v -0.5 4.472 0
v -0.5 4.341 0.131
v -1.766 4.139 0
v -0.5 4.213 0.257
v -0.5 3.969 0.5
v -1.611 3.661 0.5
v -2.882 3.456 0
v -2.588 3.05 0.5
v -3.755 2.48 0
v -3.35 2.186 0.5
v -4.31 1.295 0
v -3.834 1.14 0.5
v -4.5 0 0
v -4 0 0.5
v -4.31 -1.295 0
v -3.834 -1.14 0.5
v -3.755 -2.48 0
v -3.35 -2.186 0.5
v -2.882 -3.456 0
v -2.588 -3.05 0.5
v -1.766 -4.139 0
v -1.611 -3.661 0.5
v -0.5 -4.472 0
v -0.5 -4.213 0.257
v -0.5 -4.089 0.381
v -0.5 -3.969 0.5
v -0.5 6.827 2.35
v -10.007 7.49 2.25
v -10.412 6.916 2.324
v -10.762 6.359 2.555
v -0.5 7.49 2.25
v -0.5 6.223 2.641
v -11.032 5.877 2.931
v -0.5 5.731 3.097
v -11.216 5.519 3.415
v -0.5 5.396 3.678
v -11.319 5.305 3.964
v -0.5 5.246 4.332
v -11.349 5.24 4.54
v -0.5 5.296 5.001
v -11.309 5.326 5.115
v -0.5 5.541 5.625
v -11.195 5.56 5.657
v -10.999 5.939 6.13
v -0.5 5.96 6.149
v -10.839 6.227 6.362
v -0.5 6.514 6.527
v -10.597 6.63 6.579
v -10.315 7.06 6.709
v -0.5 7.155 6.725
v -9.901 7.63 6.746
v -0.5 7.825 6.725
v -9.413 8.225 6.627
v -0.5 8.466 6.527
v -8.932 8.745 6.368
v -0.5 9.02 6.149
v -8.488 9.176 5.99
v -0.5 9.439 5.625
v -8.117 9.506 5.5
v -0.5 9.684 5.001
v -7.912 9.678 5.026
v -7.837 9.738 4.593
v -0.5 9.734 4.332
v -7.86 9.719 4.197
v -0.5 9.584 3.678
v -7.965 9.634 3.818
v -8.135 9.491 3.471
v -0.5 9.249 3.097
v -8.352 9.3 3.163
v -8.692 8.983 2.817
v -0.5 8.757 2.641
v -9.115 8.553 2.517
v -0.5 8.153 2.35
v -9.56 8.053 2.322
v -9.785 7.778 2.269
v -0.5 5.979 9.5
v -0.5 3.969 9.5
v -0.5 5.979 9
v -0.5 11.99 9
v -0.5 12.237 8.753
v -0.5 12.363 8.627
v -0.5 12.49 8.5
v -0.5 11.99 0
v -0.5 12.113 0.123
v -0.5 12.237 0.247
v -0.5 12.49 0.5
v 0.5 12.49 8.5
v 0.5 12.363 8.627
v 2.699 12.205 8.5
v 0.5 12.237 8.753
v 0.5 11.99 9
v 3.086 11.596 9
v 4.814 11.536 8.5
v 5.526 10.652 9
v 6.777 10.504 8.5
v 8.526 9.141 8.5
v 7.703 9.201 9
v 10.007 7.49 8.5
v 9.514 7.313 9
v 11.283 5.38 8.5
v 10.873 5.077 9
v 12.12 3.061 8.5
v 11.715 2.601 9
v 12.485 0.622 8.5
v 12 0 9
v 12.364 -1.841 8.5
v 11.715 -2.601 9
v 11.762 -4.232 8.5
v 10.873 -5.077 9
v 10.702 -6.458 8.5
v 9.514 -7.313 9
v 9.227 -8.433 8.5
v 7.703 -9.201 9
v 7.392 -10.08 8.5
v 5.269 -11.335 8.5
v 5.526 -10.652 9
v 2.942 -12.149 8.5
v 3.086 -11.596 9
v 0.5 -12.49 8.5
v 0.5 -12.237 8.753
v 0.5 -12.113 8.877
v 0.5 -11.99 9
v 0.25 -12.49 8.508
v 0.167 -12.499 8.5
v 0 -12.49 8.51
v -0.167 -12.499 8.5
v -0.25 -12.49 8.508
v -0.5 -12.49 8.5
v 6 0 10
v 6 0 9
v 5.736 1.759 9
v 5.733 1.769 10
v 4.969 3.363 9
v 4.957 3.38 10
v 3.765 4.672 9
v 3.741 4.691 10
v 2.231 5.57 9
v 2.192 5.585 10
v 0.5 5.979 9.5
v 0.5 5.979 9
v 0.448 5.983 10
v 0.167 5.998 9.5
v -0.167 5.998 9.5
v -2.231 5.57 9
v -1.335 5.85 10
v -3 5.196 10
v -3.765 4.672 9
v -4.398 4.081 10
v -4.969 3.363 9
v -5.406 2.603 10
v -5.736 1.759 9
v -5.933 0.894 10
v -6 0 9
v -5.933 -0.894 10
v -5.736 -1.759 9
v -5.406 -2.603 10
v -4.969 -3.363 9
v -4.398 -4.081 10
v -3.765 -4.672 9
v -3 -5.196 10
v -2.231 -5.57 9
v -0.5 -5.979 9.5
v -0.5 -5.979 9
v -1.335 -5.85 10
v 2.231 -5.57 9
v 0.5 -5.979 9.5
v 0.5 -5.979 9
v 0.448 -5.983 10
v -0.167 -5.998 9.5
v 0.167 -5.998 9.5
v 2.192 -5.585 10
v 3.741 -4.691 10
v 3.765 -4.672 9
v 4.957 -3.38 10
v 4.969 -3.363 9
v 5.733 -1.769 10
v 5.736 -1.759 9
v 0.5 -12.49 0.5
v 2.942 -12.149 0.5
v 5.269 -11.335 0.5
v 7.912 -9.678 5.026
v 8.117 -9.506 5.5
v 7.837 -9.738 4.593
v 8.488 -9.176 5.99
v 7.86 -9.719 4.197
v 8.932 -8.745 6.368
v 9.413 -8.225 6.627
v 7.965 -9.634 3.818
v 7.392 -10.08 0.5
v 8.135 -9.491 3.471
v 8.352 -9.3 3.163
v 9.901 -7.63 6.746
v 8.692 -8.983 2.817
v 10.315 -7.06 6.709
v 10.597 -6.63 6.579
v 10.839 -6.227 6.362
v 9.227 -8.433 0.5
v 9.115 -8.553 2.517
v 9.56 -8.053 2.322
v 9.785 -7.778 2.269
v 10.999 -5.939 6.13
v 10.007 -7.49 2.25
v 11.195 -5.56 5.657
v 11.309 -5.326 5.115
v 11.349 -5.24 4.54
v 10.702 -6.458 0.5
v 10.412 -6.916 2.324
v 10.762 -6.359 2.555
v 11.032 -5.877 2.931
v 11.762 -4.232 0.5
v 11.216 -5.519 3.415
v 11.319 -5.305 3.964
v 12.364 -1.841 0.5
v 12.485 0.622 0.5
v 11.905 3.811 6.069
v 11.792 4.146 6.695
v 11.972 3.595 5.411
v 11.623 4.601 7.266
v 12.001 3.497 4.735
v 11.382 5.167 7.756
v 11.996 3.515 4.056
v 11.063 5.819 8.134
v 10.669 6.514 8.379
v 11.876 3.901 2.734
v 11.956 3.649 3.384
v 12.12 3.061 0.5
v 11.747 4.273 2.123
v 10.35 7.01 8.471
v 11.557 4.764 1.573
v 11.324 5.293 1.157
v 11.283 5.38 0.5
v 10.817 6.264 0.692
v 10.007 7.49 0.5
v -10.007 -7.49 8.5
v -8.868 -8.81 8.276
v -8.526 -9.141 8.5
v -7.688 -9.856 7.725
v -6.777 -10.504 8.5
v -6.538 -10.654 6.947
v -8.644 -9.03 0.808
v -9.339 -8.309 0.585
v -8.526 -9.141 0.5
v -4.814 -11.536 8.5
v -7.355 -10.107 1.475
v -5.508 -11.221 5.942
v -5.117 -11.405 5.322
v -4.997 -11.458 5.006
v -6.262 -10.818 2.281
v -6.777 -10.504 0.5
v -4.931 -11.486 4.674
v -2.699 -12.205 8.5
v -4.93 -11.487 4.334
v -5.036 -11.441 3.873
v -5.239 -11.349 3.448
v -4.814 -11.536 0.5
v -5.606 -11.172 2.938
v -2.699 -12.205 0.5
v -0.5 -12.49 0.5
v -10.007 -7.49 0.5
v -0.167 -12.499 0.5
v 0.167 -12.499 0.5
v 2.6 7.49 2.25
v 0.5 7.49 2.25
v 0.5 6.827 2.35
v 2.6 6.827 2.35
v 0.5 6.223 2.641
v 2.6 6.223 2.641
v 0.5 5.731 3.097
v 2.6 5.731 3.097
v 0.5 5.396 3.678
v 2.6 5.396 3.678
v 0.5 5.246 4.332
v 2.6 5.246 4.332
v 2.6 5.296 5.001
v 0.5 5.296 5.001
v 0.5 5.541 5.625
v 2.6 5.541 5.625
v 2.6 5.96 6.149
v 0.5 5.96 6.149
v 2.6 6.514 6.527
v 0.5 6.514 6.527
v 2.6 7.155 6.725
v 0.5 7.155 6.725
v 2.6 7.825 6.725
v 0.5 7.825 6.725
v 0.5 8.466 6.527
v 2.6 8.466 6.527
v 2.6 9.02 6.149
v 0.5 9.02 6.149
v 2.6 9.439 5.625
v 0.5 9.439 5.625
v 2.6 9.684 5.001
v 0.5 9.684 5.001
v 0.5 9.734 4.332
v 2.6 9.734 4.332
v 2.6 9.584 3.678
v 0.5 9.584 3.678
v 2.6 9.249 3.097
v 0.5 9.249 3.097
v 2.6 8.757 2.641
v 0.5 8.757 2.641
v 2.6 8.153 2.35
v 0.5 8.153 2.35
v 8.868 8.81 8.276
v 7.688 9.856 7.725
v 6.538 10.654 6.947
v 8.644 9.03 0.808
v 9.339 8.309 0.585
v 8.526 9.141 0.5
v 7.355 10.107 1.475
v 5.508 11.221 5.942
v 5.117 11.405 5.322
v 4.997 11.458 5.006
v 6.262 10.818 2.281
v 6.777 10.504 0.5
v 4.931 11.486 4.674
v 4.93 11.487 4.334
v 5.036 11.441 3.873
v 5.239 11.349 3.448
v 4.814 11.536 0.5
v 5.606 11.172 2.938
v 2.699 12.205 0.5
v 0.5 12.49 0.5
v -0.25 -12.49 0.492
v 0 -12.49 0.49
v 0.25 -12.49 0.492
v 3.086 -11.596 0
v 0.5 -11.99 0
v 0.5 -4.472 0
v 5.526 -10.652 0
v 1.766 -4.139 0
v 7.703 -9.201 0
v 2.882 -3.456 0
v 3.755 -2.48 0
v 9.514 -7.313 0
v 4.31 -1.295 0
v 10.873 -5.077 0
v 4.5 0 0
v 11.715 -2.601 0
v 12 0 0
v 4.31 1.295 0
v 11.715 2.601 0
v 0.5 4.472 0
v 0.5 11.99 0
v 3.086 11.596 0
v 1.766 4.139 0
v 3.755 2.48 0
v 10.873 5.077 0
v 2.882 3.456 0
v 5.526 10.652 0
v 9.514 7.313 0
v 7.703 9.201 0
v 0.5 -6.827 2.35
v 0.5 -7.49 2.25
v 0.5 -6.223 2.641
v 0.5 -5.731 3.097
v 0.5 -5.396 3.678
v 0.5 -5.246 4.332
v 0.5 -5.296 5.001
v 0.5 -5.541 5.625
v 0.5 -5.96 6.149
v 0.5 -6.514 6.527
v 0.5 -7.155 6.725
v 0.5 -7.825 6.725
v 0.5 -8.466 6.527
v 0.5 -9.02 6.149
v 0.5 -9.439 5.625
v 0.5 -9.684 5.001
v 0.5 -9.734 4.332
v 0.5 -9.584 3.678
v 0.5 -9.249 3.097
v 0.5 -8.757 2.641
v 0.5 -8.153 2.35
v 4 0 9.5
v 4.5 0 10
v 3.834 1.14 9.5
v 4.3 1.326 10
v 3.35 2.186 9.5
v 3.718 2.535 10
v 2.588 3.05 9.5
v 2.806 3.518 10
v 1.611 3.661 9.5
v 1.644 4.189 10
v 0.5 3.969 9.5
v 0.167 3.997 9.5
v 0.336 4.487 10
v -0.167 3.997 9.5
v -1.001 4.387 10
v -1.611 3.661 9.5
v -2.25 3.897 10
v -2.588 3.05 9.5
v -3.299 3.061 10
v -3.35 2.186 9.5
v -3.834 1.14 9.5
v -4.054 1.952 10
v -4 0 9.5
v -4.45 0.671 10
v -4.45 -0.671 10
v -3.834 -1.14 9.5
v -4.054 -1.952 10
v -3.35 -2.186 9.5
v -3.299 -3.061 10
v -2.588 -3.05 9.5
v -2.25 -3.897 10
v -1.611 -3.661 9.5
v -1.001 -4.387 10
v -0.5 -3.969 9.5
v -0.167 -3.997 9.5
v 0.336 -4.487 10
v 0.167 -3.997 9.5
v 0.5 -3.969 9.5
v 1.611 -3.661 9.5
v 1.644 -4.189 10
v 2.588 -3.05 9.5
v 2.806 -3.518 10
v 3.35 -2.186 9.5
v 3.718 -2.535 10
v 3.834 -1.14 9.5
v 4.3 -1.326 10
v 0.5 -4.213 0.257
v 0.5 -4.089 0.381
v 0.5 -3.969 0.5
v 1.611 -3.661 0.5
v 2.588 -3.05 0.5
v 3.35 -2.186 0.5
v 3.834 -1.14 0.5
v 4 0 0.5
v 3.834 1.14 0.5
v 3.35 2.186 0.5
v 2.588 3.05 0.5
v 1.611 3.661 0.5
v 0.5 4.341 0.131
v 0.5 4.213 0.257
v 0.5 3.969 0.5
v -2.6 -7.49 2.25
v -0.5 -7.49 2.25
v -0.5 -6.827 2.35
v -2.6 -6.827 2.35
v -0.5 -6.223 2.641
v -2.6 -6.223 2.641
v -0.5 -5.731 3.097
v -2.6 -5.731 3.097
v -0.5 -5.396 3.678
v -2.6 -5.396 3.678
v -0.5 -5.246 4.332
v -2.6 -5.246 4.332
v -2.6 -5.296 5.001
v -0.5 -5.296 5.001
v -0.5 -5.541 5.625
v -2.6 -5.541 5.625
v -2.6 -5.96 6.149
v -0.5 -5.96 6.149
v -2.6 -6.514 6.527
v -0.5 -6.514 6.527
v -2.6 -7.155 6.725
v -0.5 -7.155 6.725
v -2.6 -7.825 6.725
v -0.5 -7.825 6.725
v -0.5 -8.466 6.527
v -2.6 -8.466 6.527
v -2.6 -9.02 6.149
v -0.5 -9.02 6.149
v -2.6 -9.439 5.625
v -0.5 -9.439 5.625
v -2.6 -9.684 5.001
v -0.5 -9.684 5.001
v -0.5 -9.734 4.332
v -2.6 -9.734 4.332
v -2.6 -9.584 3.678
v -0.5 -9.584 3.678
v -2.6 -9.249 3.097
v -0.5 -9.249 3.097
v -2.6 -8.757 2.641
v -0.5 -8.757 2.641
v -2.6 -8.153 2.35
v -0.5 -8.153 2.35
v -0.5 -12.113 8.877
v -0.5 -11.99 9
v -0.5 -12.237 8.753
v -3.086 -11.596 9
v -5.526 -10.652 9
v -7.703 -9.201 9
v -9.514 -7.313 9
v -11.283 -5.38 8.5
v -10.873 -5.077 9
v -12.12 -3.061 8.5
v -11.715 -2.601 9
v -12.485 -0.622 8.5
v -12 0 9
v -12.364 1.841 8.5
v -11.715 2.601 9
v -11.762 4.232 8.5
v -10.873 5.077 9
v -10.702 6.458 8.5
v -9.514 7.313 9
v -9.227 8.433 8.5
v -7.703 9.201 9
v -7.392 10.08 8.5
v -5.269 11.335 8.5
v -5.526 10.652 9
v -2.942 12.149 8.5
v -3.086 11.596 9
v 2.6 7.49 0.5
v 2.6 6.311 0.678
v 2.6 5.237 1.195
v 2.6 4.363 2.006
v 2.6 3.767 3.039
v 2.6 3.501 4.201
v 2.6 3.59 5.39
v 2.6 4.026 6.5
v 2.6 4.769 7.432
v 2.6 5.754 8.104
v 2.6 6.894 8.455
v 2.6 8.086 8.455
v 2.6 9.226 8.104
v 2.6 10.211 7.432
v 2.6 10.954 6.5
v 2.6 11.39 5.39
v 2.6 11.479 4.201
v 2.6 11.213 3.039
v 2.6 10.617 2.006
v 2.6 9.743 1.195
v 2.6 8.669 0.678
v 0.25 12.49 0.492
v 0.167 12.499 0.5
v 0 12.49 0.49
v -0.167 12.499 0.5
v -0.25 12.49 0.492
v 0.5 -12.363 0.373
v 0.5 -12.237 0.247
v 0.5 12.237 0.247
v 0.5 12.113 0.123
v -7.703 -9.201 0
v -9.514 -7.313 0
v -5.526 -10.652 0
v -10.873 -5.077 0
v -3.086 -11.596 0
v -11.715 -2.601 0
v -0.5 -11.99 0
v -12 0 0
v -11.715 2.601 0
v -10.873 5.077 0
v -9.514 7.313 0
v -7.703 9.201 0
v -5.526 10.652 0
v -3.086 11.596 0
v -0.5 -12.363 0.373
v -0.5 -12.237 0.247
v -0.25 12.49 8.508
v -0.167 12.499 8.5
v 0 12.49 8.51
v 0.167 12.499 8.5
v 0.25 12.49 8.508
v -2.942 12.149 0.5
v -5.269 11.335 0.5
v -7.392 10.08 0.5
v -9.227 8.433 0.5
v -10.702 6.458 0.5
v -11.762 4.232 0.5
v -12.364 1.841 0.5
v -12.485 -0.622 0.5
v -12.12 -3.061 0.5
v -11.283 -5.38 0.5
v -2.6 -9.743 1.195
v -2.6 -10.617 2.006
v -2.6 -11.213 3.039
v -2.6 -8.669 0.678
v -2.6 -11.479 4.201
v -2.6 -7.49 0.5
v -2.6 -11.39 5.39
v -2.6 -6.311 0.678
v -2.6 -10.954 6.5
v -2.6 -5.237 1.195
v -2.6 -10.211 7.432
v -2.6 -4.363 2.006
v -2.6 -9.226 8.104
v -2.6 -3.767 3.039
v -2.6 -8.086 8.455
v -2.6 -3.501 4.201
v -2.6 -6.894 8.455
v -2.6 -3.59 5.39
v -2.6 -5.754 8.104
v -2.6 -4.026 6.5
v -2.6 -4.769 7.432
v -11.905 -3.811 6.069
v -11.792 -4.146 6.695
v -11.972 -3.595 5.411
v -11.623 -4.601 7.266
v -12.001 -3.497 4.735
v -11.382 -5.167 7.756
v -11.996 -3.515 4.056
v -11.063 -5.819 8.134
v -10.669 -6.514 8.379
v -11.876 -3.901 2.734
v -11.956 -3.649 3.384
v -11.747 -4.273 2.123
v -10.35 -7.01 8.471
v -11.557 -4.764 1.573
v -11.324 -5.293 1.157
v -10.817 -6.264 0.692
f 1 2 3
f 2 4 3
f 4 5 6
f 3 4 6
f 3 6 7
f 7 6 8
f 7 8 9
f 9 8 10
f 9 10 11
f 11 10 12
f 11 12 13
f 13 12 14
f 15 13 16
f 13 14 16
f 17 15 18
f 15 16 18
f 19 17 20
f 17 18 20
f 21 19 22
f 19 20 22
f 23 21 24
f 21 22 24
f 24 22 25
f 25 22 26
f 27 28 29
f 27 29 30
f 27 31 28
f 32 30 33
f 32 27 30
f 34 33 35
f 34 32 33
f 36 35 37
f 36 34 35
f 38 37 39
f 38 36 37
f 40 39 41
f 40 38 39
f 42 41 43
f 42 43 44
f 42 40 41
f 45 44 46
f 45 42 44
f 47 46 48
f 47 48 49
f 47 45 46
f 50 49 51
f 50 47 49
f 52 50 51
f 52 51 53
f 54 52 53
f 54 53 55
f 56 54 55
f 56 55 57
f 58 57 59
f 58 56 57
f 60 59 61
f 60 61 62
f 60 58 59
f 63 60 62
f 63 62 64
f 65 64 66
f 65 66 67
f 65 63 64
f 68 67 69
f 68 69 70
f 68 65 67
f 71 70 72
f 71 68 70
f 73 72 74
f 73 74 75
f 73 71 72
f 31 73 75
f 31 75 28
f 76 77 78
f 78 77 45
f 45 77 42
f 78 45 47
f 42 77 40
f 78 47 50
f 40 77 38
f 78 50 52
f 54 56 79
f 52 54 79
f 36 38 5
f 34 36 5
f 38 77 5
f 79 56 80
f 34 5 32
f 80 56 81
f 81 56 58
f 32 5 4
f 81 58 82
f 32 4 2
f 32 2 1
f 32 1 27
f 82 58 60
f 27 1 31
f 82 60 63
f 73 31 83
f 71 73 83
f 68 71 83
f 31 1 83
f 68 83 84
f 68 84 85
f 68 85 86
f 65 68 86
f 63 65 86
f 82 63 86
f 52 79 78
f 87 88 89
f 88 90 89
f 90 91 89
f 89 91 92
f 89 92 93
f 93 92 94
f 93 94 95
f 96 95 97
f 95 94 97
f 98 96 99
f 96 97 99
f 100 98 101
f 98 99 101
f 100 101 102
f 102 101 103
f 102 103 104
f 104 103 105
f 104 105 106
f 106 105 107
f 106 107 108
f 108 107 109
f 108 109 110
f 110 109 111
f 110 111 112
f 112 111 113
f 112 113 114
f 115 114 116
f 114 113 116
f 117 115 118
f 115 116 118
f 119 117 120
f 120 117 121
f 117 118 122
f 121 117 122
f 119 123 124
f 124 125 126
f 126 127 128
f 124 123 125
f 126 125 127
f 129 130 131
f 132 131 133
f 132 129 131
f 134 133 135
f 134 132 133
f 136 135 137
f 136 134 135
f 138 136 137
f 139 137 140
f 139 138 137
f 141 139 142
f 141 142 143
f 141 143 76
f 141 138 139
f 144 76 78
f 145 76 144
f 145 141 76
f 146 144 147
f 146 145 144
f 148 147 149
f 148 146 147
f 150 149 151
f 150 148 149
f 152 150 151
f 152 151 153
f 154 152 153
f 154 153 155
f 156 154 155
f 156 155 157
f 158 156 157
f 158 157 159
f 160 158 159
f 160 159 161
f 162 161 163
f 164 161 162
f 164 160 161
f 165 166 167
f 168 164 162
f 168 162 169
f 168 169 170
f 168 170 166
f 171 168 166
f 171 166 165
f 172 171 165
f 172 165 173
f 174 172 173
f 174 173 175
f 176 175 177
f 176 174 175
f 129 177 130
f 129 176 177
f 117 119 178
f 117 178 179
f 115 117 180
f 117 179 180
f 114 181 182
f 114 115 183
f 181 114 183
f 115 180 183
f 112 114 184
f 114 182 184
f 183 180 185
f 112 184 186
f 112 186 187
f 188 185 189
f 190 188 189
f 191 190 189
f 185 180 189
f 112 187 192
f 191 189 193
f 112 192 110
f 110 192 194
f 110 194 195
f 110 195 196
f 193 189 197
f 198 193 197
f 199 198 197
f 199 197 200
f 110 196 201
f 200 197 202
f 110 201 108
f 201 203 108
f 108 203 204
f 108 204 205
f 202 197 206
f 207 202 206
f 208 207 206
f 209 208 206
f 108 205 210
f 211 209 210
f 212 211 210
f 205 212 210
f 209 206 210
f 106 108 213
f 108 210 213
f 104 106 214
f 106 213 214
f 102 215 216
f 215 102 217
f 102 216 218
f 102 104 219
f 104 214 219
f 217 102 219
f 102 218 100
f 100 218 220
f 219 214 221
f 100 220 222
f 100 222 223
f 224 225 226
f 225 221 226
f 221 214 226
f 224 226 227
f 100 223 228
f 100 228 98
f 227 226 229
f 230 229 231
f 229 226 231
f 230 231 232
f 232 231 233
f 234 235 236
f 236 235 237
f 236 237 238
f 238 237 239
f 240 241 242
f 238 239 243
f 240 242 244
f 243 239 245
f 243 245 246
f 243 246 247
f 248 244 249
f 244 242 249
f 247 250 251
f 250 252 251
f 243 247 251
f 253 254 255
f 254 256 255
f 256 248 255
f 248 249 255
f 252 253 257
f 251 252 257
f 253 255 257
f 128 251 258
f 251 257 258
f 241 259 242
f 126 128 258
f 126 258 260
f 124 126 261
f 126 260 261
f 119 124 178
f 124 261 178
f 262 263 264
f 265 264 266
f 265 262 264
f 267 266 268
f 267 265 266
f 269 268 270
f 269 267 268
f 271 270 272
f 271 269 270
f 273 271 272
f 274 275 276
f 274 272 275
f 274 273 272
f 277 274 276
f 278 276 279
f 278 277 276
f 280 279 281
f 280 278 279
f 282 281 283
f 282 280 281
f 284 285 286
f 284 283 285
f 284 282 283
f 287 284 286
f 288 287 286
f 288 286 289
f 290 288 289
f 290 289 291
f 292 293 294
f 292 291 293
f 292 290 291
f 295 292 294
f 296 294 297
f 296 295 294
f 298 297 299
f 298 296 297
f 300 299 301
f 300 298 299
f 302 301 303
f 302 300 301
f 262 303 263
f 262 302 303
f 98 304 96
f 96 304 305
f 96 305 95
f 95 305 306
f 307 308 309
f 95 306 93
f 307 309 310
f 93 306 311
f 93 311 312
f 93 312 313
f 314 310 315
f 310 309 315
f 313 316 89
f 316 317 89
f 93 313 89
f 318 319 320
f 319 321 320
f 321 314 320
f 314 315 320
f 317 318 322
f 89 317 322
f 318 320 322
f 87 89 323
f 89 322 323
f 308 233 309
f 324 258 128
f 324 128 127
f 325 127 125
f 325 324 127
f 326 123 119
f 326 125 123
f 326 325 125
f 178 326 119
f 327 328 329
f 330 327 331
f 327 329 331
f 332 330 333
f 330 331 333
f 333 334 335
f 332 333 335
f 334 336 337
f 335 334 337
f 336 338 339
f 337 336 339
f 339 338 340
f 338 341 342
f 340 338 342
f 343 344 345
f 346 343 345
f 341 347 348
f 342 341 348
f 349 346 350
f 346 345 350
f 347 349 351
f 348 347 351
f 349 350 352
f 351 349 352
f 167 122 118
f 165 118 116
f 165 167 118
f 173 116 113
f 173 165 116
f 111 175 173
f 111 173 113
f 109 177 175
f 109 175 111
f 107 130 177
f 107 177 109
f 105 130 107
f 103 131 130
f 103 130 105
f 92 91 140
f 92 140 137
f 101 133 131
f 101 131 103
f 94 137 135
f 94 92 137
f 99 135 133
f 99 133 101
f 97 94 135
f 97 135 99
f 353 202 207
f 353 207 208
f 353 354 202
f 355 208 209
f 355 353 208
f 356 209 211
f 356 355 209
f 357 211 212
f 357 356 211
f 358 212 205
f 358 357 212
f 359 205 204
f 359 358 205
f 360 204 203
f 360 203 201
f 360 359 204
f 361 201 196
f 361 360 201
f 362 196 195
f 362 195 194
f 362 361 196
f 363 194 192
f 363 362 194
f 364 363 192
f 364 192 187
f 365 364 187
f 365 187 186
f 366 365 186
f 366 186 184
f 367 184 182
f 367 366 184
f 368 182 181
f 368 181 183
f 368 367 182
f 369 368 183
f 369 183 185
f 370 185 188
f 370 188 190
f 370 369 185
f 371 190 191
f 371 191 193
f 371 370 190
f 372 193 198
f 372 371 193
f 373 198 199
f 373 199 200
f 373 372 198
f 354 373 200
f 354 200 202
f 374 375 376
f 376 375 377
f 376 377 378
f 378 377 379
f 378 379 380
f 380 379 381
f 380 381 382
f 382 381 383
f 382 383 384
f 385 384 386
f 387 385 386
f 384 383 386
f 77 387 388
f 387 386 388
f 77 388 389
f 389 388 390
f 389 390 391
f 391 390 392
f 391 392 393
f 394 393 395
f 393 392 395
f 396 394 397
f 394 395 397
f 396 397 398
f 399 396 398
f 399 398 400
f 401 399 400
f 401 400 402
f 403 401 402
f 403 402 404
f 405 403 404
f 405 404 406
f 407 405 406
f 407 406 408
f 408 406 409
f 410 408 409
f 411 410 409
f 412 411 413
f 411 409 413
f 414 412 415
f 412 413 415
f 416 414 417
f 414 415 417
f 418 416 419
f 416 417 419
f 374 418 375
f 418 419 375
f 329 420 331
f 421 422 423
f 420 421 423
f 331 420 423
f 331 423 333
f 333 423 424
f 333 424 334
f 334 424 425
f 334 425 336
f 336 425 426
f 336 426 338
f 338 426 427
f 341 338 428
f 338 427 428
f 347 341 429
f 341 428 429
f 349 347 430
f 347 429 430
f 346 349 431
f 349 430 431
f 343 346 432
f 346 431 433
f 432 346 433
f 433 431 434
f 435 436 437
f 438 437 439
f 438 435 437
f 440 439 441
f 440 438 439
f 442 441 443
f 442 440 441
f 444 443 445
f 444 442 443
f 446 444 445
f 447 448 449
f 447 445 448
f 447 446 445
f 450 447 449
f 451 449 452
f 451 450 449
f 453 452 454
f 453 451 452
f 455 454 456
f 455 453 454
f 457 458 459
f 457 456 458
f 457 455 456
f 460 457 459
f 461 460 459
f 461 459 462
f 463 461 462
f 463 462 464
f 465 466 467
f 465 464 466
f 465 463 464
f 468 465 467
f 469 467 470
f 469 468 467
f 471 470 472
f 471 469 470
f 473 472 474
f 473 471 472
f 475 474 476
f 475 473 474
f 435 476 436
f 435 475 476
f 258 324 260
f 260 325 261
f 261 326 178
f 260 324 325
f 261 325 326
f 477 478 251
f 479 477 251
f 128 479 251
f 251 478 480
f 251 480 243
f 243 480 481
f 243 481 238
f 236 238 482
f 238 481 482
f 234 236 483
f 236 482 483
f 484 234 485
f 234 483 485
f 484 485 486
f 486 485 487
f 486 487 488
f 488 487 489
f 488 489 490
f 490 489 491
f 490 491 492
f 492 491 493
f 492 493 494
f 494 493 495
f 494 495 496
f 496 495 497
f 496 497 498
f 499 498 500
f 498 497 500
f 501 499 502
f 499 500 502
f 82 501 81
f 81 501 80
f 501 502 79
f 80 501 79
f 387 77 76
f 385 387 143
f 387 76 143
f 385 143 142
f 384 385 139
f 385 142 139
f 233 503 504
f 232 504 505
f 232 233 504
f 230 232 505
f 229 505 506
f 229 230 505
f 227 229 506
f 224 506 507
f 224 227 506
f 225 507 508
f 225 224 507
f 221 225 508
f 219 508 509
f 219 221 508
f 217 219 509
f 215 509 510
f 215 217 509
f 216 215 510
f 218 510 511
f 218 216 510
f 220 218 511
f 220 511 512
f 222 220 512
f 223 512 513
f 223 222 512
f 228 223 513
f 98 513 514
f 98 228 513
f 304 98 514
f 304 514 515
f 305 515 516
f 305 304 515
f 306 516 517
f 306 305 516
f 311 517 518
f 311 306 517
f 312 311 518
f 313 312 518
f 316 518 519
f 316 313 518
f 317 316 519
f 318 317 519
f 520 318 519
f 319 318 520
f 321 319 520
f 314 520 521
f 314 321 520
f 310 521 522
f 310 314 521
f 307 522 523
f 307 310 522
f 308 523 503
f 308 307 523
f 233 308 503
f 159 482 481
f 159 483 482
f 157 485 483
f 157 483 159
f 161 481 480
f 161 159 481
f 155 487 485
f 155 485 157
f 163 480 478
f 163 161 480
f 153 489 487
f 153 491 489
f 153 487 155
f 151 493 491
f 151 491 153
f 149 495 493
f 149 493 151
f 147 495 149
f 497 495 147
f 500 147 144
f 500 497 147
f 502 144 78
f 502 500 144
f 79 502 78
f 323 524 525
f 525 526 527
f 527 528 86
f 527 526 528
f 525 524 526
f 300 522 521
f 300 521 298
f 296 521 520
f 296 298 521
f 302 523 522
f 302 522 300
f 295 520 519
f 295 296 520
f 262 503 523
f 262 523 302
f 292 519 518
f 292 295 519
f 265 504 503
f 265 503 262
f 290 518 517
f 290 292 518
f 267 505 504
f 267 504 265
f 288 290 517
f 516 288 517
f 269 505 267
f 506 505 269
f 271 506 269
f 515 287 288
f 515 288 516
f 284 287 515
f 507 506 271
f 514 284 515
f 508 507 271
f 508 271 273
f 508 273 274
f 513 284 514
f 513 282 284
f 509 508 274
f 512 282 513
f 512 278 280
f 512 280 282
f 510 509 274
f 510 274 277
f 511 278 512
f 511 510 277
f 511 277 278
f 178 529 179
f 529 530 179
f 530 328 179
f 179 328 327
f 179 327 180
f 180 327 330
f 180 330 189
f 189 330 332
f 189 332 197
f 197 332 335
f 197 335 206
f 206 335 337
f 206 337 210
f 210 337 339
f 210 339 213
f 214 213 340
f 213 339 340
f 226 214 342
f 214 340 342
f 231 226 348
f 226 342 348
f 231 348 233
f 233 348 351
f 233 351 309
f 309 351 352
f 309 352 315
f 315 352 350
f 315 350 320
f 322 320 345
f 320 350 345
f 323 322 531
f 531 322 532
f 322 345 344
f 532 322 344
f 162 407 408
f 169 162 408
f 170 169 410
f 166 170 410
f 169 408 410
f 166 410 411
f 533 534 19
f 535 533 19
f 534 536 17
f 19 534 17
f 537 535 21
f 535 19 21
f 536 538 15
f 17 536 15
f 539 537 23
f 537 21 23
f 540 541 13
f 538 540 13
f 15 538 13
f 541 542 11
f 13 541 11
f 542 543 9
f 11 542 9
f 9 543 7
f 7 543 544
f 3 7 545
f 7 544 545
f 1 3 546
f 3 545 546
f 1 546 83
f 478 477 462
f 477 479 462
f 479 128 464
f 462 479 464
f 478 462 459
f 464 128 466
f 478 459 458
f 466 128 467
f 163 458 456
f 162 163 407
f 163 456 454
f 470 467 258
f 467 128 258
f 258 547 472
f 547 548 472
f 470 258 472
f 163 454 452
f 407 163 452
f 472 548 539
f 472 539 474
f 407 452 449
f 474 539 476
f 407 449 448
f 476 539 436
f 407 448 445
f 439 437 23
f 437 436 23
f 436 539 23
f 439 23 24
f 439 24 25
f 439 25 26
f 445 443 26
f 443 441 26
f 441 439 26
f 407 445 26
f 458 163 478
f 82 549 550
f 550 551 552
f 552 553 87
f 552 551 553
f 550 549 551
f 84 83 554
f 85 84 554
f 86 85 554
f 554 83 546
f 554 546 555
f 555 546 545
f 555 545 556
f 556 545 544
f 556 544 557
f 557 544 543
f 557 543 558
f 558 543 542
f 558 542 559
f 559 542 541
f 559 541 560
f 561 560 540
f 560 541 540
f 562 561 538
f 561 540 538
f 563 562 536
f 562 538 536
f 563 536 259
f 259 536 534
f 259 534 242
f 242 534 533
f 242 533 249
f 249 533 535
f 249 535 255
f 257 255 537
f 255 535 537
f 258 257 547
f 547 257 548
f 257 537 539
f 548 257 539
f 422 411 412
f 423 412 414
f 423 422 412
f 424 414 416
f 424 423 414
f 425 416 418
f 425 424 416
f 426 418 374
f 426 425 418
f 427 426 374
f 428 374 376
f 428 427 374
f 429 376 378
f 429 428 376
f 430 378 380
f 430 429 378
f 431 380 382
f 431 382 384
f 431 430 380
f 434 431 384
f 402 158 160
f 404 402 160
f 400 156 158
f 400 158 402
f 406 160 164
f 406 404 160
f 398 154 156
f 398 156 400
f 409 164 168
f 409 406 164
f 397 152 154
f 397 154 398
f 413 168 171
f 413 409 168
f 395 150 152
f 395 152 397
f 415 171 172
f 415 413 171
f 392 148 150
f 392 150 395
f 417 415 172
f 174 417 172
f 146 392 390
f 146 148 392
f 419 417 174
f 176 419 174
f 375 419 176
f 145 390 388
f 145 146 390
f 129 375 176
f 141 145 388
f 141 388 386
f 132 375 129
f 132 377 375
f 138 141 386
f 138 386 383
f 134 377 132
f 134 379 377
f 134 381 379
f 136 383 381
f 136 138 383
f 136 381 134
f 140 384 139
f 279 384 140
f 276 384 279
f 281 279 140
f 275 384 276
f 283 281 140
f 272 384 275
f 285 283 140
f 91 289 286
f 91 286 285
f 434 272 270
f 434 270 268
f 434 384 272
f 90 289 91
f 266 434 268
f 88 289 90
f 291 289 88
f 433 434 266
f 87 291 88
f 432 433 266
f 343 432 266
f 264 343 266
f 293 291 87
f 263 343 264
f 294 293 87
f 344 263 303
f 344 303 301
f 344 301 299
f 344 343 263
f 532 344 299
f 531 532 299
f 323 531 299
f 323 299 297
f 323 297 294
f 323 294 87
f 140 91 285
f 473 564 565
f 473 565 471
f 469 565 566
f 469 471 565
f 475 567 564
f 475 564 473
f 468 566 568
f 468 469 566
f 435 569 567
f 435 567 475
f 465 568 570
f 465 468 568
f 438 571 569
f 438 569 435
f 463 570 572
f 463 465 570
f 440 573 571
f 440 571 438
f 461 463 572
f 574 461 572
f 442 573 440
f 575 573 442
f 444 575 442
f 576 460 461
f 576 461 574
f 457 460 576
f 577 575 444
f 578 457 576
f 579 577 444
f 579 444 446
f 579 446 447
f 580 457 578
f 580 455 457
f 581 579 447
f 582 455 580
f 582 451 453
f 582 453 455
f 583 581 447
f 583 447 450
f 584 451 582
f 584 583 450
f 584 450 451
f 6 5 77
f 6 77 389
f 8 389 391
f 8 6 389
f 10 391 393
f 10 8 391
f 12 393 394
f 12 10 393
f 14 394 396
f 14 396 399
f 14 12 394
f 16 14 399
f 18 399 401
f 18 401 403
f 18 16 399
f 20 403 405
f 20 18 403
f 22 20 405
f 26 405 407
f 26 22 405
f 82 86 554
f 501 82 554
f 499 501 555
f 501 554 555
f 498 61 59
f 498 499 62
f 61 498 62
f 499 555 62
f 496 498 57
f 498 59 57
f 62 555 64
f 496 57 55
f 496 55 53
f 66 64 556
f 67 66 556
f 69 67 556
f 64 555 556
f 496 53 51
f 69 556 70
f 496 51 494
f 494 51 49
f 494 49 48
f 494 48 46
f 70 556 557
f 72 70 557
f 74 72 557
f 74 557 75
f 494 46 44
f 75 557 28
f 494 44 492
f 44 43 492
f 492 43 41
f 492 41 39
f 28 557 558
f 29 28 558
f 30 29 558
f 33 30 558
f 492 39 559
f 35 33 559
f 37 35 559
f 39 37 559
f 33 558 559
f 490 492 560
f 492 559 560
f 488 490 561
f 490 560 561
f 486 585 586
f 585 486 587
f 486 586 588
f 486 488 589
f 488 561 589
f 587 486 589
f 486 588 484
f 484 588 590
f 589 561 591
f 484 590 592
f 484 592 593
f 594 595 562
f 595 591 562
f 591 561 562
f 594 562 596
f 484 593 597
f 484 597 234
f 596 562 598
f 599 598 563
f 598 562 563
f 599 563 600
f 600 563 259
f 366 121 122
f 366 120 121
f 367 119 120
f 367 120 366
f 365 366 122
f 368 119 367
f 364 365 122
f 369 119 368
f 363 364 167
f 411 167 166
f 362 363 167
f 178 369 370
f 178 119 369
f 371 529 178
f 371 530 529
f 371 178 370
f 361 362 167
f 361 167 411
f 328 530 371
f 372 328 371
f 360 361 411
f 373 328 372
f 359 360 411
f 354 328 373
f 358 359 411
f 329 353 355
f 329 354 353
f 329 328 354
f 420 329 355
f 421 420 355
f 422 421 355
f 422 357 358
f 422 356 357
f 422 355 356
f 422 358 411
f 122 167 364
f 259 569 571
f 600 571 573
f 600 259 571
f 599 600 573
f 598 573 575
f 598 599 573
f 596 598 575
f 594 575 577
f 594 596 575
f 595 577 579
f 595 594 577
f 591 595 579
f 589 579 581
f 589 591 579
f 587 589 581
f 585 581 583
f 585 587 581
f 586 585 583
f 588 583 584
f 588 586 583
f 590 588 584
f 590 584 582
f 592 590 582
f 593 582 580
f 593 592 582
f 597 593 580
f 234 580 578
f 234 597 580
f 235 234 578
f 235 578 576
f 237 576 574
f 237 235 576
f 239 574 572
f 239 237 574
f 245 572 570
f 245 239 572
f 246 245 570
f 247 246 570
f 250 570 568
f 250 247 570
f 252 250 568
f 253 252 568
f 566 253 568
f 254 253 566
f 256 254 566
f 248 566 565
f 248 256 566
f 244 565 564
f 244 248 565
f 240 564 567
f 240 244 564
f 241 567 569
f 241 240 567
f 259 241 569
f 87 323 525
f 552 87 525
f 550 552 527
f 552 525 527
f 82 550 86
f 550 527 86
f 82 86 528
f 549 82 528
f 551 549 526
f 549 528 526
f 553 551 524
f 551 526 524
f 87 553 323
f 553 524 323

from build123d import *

# Parameters (mm, degrees)
CROQUIS1_R              = 12.5
CROQUIS1_R_2            = 4
SALIENTE_EXTRUIR1_DEPTH = 10
CROQUIS2_OUTSIDE_W      = 34.348
CROQUIS2_OUTSIDE_H      = 34.348
CROQUIS2_OUTSIDE_R      = 6
CORTAR_EXTRUIR1_DEPTH   = 1
CHAFL_N1_SIZE           = 0.5
CROQUIS3_W              = 1
CROQUIS3_H              = 24.979991994
CORTAR_EXTRUIR2_DEPTH   = 9.5
MATRIZC1_COUNT          = 2
MATRIZC1_ANGLE          = 180


with BuildPart() as part:
    # Croquis1 → Saliente-Extruir1 (new body)
    with BuildSketch(Plane.XY):
        Circle(CROQUIS1_R)
        Circle(CROQUIS1_R_2, mode=Mode.SUBTRACT)
    extrude(amount=SALIENTE_EXTRUIR1_DEPTH)

    # Croquis2 outside → Cortar-Extruir1 (cut)
    with BuildSketch(Plane.XY.offset(10)):
        Rectangle(CROQUIS2_OUTSIDE_W, CROQUIS2_OUTSIDE_H)
        Circle(CROQUIS2_OUTSIDE_R, mode=Mode.SUBTRACT)
    extrude(amount=-CORTAR_EXTRUIR1_DEPTH, mode=Mode.SUBTRACT)

    # Chaflán1
    chafl_n1_edges = [part.edges().sort_by_distance(p)[0] for p in [
        (-12.5, 0, 9),
        (-12.5, 0, 0),
        (-4, 0, 0),
        (-4, 0, 10),
    ]]
    chamfer(chafl_n1_edges, length=CHAFL_N1_SIZE)

    # Croquis3 → Cortar-Extruir2 (cut)
    with BuildSketch(Plane.XY):
        Rectangle(CROQUIS3_W, CROQUIS3_H)
    extrude(amount=CORTAR_EXTRUIR2_DEPTH, mode=Mode.SUBTRACT)

    # Croquis8 → Refrentado para tornillo con cabeza troncocónica de M45 (revolve, cut)
    with BuildSketch(Plane(origin=(13, 7.489995997, 4.5), x_dir=(0, 0, -1), z_dir=(0, 1, 0))):
        Polygon((0, 0), (0, 31.351936393), (2.25, 30), (2.25, 10.4), (4, 10.4), (4, 0), align=None)
    refrentado_para_tornillo_con_cabeza_tron = revolve(axis=Axis((19.35, 7.489995997, 4.5), (-1, 0, 0)), mode=Mode.SUBTRACT)

    # MatrizC1: Refrentado para tornillo con cabeza troncocónica de M45 ×2 about axis
    matrizc1_axis = Axis((0, 0, 9.5), (0, 0, -1))
    for i in range(1, MATRIZC1_COUNT):
        add(refrentado_para_tornillo_con_cabeza_tron.rotate(matrizc1_axis, i * MATRIZC1_ANGLE / (MATRIZC1_COUNT - 1)), mode=Mode.SUBTRACT)


solid = part.part
